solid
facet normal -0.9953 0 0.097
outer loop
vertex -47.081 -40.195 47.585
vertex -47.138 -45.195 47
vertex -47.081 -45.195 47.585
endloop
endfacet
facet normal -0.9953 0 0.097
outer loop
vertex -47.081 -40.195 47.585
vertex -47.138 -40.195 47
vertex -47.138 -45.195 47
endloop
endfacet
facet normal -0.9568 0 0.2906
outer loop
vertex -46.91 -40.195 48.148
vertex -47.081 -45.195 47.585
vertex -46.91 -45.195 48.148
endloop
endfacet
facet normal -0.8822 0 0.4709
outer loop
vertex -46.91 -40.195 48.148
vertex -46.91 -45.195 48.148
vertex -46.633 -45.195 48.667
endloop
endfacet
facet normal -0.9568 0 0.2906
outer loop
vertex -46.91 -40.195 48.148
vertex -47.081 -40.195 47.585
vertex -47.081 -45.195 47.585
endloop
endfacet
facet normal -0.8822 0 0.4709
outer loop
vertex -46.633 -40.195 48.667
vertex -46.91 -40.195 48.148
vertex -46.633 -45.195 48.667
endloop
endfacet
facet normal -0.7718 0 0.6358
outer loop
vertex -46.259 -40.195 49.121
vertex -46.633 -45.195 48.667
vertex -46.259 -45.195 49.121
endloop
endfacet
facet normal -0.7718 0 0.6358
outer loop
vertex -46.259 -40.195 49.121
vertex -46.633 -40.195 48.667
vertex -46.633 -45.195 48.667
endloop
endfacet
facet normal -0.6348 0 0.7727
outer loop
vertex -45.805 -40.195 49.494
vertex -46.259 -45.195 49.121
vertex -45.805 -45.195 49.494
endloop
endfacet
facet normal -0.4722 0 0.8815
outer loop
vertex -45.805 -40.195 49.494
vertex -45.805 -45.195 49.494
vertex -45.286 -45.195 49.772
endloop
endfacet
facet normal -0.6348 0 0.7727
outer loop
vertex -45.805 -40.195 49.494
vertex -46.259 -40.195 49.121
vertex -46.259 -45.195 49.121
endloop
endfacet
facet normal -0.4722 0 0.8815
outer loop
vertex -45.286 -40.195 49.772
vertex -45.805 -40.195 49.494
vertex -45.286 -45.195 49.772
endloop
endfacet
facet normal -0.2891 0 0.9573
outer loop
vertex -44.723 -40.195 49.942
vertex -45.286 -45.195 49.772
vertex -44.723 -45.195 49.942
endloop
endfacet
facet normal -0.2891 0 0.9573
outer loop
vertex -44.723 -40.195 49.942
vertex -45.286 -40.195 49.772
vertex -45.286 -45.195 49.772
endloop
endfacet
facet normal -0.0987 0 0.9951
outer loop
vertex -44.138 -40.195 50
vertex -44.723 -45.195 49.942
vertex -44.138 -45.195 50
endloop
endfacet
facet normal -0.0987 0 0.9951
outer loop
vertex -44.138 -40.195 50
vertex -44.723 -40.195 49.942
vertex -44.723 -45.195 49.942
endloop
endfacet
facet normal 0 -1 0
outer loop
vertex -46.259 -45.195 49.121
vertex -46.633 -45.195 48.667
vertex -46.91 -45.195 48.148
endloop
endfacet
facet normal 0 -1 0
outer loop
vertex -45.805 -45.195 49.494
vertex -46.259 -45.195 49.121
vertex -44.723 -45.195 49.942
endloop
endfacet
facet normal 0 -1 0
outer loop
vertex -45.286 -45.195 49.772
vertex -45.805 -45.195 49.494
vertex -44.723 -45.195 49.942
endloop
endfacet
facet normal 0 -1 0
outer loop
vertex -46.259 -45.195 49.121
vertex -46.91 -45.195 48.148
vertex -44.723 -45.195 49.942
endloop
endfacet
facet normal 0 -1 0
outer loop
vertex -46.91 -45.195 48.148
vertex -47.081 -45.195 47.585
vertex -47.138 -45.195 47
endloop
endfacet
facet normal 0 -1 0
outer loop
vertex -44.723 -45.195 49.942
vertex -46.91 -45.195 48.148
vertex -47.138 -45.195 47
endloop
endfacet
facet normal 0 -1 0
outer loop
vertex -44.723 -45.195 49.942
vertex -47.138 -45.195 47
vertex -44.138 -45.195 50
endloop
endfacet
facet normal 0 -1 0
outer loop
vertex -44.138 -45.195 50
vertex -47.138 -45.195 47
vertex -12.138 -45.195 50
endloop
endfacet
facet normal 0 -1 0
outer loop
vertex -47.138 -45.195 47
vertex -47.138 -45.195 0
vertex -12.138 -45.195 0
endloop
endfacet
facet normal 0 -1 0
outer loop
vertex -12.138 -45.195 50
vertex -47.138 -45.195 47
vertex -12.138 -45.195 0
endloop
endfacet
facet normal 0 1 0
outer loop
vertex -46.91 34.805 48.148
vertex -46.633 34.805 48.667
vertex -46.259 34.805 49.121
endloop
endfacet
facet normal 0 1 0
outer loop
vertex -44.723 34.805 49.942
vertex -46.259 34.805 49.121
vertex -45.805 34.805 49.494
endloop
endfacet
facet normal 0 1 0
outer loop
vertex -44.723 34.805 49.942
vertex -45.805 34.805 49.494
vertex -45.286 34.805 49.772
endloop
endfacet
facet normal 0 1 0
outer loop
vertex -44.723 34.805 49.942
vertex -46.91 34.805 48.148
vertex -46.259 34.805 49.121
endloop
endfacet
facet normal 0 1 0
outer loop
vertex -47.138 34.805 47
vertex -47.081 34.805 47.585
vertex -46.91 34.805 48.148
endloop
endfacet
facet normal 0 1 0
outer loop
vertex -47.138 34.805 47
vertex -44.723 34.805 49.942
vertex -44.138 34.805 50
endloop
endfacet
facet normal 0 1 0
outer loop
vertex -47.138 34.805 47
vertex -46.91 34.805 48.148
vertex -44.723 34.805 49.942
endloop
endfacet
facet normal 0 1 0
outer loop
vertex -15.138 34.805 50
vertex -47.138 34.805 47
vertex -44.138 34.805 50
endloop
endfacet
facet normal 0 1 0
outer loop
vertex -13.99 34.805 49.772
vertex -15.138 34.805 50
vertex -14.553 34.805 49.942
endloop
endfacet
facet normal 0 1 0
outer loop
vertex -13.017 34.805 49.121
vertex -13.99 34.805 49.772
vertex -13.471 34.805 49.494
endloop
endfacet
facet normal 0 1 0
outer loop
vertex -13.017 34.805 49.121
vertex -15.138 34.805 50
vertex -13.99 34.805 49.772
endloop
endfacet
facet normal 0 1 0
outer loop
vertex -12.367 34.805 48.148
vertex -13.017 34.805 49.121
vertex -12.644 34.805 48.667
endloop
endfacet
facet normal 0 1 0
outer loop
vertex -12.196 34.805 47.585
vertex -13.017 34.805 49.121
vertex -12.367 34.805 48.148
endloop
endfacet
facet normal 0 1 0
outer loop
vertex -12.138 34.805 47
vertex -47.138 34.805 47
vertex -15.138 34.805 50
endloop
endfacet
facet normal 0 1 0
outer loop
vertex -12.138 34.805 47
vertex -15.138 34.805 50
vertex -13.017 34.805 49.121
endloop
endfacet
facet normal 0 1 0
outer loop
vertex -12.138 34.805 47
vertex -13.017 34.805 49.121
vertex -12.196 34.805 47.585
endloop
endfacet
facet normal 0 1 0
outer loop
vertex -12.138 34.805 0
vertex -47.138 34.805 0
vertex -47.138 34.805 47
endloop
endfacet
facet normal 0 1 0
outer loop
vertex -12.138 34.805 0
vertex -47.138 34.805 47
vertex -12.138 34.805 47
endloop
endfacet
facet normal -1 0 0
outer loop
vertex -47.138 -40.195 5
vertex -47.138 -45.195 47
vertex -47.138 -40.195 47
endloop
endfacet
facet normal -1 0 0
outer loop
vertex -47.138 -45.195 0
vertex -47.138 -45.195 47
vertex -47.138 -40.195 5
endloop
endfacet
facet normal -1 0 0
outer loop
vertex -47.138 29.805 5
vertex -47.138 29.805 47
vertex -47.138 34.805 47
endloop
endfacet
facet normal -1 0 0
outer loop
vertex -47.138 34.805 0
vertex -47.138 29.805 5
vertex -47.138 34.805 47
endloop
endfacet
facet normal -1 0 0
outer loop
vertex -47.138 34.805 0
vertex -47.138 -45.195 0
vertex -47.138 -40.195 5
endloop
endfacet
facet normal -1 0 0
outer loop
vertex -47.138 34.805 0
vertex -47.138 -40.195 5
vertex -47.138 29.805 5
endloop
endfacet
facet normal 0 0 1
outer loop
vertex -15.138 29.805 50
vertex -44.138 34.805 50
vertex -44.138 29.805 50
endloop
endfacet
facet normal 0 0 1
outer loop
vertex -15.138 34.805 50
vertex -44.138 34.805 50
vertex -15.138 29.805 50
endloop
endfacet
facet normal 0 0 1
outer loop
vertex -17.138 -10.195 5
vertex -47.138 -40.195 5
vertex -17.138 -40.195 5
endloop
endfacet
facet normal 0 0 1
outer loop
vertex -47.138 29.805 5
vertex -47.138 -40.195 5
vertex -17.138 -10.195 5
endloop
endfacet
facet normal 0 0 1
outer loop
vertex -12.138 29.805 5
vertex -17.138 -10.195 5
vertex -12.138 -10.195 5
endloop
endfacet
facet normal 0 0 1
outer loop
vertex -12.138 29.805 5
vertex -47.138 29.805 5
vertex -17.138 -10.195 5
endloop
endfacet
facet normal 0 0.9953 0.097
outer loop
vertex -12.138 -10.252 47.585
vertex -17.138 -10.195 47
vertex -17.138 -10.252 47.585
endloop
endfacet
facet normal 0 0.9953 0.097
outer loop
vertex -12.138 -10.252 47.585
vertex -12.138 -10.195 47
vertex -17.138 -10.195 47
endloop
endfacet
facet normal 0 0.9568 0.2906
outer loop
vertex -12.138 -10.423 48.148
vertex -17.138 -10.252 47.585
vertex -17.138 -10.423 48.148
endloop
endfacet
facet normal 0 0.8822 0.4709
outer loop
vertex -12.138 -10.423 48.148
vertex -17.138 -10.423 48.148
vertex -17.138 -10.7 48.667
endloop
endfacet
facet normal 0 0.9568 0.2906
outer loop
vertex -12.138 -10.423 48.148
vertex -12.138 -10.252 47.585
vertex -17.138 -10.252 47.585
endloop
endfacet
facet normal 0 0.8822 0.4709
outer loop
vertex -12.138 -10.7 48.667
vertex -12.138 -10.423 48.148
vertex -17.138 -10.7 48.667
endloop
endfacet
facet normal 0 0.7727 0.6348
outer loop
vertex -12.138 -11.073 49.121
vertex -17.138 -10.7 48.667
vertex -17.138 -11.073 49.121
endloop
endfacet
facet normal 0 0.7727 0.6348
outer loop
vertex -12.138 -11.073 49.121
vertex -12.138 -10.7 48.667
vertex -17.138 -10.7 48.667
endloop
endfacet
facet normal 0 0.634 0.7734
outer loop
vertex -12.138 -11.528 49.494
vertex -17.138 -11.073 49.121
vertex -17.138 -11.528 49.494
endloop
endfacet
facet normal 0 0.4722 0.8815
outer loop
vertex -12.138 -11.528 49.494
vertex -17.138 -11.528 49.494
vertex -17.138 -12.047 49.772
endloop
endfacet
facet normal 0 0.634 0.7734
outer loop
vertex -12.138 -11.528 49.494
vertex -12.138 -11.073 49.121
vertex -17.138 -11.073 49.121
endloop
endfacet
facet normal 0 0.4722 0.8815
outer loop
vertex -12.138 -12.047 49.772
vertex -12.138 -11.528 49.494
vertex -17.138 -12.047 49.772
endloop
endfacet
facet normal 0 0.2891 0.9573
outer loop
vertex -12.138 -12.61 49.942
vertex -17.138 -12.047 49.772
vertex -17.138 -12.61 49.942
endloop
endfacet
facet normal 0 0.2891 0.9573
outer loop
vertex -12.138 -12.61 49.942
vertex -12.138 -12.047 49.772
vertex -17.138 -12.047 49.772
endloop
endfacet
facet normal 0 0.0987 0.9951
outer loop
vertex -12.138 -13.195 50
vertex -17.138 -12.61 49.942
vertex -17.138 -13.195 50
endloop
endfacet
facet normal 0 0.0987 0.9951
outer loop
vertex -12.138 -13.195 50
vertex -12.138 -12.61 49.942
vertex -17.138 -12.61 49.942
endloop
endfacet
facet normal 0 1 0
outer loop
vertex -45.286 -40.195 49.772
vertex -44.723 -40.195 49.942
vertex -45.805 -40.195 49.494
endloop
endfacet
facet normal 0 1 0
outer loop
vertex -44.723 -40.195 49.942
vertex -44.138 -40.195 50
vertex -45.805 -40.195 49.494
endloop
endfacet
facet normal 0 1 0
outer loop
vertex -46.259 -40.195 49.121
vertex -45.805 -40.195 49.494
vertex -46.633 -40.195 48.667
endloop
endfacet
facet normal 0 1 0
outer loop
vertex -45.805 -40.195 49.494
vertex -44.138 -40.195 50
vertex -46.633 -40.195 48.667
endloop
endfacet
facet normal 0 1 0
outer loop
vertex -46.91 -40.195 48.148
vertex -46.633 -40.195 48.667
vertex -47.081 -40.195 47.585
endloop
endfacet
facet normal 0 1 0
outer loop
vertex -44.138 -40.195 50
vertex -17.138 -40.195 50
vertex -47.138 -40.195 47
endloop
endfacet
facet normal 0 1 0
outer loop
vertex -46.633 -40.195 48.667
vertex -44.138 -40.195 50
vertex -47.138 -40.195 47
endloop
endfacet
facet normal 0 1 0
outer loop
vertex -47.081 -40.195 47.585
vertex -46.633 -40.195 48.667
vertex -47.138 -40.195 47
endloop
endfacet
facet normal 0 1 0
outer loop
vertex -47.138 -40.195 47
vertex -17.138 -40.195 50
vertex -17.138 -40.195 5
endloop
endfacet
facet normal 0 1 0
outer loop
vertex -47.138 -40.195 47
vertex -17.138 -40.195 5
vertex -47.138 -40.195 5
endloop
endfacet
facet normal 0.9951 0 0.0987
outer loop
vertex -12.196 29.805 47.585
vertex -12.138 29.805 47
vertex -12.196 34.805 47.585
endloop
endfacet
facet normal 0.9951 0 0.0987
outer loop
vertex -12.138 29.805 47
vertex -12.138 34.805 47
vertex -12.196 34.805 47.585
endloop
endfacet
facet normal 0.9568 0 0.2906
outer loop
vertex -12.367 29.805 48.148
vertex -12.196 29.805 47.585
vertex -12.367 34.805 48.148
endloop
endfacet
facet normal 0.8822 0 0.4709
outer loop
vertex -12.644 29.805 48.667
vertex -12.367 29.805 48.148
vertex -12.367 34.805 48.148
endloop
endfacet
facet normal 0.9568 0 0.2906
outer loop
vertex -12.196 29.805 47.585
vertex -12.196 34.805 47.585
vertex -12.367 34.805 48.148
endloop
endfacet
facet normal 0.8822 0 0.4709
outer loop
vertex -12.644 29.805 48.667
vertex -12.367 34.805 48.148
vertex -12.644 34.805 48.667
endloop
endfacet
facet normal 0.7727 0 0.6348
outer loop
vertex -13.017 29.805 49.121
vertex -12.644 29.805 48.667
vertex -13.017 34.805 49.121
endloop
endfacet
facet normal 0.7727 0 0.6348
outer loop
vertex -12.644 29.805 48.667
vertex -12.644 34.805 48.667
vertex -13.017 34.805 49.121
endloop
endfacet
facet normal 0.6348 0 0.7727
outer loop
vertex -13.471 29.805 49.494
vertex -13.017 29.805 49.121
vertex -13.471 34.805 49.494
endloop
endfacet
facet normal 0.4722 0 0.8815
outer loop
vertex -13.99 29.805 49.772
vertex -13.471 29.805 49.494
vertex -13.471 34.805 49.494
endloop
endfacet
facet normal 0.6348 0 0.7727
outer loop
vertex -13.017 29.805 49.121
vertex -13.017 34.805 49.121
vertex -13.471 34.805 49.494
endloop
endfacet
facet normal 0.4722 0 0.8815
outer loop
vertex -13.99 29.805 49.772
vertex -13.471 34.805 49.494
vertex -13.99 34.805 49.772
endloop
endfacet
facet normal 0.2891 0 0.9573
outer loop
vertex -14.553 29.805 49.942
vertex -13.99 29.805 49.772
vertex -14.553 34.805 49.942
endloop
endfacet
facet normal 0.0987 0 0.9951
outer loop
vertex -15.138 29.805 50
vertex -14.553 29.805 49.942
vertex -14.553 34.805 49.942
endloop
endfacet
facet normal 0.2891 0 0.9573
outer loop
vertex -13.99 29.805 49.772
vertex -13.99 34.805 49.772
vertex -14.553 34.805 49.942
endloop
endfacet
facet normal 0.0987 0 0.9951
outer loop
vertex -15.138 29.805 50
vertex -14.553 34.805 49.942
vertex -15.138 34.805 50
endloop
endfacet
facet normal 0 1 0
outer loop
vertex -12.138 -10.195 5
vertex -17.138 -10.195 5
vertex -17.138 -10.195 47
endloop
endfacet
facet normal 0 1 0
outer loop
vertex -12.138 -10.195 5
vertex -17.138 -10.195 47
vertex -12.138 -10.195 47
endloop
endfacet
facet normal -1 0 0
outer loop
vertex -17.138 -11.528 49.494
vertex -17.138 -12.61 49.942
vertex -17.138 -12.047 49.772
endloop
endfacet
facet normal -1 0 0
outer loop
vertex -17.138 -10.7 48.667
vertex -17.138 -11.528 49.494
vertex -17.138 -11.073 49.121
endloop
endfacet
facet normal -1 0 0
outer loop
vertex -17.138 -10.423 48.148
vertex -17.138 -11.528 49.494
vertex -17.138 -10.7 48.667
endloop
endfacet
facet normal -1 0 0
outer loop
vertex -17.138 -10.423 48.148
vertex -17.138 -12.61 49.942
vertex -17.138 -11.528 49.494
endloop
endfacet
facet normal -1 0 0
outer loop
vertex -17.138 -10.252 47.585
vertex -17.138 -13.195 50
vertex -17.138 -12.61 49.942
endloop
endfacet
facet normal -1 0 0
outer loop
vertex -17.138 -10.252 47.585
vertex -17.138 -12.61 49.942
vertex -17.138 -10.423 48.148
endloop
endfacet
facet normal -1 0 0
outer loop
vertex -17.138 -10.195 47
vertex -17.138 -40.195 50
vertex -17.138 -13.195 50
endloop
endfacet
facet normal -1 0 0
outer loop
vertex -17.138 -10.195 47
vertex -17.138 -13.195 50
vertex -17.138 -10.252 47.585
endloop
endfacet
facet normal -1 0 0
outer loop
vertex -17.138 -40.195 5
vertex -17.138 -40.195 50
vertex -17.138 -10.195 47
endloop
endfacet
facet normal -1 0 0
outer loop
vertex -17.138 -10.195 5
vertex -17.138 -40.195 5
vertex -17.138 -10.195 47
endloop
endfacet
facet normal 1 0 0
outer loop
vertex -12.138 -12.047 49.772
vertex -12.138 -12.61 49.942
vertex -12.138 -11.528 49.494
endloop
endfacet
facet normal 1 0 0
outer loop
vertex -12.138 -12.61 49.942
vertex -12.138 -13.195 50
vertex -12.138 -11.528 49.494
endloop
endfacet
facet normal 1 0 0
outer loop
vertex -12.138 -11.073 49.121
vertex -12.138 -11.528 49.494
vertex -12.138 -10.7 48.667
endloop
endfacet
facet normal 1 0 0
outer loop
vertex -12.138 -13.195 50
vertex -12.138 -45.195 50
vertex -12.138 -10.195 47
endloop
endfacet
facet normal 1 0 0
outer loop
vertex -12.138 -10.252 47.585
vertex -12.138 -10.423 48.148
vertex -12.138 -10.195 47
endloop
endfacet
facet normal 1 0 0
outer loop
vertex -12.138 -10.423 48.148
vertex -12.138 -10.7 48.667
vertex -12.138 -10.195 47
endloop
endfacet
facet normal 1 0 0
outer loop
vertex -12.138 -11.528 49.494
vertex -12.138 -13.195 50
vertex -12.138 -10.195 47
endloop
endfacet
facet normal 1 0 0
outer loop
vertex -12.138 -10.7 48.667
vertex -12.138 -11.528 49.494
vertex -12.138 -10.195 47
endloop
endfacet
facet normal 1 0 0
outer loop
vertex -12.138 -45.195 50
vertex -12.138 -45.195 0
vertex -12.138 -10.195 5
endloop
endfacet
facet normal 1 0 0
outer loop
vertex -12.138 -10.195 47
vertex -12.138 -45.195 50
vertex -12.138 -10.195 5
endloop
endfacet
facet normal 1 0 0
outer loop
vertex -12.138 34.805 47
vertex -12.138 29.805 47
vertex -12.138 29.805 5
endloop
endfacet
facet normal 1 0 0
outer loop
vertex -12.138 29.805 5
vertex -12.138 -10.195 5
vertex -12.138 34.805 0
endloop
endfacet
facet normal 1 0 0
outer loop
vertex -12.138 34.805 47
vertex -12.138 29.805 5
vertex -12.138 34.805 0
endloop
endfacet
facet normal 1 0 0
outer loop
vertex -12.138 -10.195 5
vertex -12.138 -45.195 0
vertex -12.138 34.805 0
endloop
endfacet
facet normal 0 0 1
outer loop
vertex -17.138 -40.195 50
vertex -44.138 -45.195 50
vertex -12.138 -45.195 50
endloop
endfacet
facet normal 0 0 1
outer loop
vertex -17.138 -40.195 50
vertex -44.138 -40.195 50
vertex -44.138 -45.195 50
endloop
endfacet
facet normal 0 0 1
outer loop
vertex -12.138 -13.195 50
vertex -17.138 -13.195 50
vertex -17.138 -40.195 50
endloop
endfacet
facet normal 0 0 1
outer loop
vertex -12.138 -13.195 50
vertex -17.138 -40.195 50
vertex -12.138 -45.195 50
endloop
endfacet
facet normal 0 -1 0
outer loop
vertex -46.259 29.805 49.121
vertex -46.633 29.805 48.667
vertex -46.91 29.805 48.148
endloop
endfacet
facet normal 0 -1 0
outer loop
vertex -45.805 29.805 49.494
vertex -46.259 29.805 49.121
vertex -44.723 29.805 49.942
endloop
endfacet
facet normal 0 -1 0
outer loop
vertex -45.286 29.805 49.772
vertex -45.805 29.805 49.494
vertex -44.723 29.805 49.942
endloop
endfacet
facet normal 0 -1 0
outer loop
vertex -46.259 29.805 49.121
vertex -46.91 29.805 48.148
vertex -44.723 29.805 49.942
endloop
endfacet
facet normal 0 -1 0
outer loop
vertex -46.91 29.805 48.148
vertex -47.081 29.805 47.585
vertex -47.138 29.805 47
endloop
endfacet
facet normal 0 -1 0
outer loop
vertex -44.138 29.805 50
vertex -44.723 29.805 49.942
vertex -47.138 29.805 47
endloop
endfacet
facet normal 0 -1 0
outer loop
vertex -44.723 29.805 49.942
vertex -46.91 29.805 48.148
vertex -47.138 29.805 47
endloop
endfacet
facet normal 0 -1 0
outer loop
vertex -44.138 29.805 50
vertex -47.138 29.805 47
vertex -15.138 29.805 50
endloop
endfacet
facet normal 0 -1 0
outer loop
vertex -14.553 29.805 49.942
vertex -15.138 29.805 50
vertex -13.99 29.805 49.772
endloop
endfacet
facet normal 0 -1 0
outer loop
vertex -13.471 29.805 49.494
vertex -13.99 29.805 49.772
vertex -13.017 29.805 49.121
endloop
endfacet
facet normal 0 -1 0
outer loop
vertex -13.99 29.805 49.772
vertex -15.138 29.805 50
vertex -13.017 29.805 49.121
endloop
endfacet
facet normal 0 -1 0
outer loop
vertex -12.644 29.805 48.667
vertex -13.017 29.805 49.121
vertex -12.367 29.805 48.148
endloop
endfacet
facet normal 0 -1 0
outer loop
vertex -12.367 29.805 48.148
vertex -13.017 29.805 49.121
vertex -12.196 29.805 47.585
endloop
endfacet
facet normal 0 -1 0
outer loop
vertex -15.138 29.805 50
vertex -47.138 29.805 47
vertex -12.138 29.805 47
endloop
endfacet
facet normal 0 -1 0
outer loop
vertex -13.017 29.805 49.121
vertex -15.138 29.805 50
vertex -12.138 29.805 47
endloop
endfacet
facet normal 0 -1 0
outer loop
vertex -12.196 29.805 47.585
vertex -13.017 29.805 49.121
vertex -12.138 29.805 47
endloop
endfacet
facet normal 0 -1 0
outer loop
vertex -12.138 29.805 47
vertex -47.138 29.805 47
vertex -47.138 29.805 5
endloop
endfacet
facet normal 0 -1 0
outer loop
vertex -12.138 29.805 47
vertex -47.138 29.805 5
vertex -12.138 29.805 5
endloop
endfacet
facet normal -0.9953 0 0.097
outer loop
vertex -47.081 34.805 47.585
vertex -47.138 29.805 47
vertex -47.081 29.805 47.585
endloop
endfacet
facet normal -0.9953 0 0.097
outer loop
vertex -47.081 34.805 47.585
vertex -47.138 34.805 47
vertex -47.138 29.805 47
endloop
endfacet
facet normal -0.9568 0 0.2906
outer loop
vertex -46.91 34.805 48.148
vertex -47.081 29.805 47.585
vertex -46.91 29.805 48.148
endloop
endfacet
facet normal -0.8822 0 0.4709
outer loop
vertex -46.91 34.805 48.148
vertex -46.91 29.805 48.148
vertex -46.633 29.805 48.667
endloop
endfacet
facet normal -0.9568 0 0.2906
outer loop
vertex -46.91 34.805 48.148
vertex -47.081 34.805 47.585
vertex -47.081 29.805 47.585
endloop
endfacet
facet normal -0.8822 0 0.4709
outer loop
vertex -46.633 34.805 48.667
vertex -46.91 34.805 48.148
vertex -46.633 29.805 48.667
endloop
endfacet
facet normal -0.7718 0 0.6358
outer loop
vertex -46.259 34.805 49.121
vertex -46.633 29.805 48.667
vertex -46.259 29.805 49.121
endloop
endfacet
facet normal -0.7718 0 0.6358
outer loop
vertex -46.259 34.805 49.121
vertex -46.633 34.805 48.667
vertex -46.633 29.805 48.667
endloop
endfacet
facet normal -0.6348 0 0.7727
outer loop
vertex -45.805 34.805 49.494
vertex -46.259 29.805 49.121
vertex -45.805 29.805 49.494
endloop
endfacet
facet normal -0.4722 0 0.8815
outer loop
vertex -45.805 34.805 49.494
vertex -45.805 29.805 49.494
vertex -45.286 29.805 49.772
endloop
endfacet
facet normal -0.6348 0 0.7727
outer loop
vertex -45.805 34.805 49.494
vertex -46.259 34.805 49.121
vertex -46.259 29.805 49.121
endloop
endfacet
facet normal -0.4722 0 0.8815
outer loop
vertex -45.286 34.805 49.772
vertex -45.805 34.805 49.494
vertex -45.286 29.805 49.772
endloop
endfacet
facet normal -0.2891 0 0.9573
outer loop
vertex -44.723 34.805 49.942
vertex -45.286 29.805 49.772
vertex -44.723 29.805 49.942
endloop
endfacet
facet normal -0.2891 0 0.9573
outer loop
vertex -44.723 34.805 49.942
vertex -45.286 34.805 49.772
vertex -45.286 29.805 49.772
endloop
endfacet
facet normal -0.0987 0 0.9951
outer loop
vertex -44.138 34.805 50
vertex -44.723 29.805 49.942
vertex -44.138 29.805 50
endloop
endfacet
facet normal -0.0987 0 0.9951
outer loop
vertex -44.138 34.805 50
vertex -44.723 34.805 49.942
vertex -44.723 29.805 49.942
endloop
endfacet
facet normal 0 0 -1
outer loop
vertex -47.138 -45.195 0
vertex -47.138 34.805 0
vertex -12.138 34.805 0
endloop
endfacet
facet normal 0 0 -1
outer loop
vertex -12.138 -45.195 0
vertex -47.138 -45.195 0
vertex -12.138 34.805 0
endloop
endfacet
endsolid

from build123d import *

# Parameters (mm, degrees)
SKETCH_1_W      = 35
SKETCH_1_H      = 80
EXTRUDE_1_DEPTH = 5
SKETCH_2_W      = 35
SKETCH_2_H      = 5
SKETCH_2_W_2    = 30
SKETCH_2_W_3    = 5
SKETCH_2_H_2    = 30
EXTRUDE_2_DEPTH = 45
FILLET_2_R      = 3


with BuildPart() as part:
    # 草圖1 → 填料-伸長1 (new body)
    with BuildSketch(Plane.XY):
        with Locations((-29.638177138, -5.194805195)):
            Rectangle(SKETCH_1_W, SKETCH_1_H)
    extrude(amount=EXTRUDE_1_DEPTH)

    # 草圖2 → 填料-伸長2 (add)
    with BuildSketch(Plane.XY.offset(5)):
        with Locations((-29.638177138, 32.305194805)):
            Rectangle(SKETCH_2_W, SKETCH_2_H)
        with Locations((-32.138177138, -42.694805195)):
            Rectangle(SKETCH_2_W_2, SKETCH_2_H)
        with Locations((-14.638177138, -42.694805195)):
            Rectangle(SKETCH_2_W_3, SKETCH_2_H)
        with Locations((-14.638177138, -25.194805195)):
            Rectangle(SKETCH_2_W_3, SKETCH_2_H_2)
    extrude(amount=EXTRUDE_2_DEPTH)

    # 圓角2
    fillet_2_edges = [part.edges().sort_by_distance(p)[0] for p in [
        (-47.138177138, -42.694805195, 50),
        (-14.638177138, -10.194805195, 50),
        (-47.138177138, 32.305194805, 50),
        (-12.138177138, 32.305194805, 50),
    ]]
    fillet(fillet_2_edges, radius=FILLET_2_R)


solid = part.part
